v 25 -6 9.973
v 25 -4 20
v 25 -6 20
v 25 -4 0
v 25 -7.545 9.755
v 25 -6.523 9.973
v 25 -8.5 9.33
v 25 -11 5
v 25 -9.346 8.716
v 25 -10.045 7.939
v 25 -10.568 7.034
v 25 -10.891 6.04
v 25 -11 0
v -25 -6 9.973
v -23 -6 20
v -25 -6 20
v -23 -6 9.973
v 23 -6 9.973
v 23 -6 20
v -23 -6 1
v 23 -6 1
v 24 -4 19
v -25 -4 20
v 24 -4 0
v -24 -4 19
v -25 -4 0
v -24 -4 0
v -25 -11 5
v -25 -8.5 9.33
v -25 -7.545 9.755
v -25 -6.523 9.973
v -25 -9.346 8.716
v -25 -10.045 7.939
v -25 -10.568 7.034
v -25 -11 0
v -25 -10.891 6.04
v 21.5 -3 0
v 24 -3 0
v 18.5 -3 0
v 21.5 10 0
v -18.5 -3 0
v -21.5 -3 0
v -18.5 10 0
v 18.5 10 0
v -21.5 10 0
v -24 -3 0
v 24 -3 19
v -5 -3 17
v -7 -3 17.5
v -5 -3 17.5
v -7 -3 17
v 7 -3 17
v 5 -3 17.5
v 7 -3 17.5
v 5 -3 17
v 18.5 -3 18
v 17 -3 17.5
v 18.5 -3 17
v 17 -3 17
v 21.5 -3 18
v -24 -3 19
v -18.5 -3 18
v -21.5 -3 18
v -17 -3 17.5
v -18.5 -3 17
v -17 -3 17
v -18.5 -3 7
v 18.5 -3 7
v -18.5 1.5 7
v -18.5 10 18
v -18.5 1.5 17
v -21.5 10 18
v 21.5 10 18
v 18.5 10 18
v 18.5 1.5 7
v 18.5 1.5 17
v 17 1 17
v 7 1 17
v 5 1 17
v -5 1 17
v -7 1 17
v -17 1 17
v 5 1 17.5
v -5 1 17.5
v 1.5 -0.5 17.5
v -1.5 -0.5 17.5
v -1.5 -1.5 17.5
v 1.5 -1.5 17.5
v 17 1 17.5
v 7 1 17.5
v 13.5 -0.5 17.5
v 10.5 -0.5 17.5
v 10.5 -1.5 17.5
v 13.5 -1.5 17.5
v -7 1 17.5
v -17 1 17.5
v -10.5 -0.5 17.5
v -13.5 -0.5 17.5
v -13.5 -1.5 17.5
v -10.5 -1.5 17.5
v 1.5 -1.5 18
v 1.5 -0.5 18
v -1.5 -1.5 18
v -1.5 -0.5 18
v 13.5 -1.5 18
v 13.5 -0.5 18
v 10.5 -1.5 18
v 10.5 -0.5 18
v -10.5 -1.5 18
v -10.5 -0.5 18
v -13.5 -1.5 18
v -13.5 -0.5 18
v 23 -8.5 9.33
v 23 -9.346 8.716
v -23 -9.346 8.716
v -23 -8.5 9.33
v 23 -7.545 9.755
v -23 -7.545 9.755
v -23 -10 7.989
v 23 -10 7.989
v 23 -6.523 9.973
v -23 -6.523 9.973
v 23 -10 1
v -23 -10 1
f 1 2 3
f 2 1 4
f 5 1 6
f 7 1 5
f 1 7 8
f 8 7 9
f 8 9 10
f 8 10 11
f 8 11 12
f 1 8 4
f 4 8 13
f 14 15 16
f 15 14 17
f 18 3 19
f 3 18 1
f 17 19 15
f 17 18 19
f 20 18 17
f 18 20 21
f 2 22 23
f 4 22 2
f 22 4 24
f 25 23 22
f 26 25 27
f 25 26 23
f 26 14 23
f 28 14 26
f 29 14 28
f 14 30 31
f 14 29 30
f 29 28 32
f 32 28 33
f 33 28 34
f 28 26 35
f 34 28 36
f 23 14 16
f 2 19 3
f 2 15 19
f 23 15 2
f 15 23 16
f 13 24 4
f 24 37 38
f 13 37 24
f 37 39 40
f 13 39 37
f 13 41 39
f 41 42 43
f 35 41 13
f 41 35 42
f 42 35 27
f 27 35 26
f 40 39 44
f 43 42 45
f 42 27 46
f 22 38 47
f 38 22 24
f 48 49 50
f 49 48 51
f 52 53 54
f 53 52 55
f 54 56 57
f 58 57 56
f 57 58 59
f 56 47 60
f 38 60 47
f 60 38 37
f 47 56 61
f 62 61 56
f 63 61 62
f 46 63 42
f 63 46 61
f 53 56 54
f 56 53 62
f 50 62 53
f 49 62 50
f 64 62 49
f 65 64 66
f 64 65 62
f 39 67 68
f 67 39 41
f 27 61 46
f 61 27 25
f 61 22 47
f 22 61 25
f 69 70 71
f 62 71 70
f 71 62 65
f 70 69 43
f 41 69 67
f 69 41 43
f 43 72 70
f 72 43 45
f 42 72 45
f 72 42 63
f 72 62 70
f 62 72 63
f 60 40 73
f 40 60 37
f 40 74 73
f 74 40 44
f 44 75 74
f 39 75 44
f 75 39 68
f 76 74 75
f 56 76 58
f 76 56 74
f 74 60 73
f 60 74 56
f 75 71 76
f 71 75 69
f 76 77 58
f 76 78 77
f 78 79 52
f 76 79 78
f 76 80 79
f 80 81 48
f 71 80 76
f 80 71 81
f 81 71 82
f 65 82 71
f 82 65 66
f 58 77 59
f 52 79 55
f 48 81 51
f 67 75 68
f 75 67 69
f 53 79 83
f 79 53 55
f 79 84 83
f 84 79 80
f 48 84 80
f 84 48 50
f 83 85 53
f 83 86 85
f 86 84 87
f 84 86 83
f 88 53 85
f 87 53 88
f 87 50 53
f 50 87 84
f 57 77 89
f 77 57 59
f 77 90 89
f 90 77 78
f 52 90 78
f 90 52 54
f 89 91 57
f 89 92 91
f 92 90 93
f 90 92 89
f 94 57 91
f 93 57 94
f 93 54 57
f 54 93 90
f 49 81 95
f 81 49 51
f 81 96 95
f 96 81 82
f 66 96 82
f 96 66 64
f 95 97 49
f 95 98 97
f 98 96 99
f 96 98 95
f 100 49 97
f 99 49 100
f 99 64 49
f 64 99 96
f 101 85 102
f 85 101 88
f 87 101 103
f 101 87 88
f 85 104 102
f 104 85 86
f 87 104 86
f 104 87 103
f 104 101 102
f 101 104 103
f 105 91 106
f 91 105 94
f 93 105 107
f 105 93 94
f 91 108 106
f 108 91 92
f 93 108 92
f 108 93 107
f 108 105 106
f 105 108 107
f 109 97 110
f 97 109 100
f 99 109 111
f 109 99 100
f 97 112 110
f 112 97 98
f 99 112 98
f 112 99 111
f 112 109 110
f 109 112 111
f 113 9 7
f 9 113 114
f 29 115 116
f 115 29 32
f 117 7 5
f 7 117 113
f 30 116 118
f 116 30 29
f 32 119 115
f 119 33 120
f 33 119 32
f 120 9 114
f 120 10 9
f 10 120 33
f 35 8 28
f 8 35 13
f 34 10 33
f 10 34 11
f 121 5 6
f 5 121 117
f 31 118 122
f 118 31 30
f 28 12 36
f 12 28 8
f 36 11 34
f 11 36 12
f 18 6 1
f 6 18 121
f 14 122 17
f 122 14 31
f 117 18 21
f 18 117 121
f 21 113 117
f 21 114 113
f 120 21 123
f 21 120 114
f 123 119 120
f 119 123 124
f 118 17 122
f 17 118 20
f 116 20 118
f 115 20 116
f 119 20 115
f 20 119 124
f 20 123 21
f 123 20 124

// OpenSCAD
$fs=0.4;

translate([0,10,10]) rotate([90,0,0]) difference() {

union()
{

translate([0,0.0,15]) cube([50,20,2], center=true);
translate([0,-0.5,14]) cube([48,19,2], center=true);

translate([-20,-1,7.5]) cube([3,18,15], center=true);
translate([20,-1,7.5]) cube([3,18,15], center=true);

translate([0,2,11]) cube([40,10,5], center=true);

translate([0,7,11]) cube([10,1,4], center=true);
translate([12,7,11]) cube([10,1,4], center=true);
translate([-12,7,11]) cube([10,1,4], center=true);

translate([0,7,11]) cube([3,2,1], center=true);
translate([12,7,11]) cube([3,2,1], center=true);
translate([-12,7,11]) cube([3,2,1], center=true);

	translate([0,-5,16]) rotate([0,-90,0]) linear_extrude(height=50, center=true) {
		intersection() {
			circle(r=5);
			square([10,10]);
		}
		translate([0,-5]) square([5,5]);
	}
}

	translate([0,5,18]) cube([46,28,4], center=true);
}
